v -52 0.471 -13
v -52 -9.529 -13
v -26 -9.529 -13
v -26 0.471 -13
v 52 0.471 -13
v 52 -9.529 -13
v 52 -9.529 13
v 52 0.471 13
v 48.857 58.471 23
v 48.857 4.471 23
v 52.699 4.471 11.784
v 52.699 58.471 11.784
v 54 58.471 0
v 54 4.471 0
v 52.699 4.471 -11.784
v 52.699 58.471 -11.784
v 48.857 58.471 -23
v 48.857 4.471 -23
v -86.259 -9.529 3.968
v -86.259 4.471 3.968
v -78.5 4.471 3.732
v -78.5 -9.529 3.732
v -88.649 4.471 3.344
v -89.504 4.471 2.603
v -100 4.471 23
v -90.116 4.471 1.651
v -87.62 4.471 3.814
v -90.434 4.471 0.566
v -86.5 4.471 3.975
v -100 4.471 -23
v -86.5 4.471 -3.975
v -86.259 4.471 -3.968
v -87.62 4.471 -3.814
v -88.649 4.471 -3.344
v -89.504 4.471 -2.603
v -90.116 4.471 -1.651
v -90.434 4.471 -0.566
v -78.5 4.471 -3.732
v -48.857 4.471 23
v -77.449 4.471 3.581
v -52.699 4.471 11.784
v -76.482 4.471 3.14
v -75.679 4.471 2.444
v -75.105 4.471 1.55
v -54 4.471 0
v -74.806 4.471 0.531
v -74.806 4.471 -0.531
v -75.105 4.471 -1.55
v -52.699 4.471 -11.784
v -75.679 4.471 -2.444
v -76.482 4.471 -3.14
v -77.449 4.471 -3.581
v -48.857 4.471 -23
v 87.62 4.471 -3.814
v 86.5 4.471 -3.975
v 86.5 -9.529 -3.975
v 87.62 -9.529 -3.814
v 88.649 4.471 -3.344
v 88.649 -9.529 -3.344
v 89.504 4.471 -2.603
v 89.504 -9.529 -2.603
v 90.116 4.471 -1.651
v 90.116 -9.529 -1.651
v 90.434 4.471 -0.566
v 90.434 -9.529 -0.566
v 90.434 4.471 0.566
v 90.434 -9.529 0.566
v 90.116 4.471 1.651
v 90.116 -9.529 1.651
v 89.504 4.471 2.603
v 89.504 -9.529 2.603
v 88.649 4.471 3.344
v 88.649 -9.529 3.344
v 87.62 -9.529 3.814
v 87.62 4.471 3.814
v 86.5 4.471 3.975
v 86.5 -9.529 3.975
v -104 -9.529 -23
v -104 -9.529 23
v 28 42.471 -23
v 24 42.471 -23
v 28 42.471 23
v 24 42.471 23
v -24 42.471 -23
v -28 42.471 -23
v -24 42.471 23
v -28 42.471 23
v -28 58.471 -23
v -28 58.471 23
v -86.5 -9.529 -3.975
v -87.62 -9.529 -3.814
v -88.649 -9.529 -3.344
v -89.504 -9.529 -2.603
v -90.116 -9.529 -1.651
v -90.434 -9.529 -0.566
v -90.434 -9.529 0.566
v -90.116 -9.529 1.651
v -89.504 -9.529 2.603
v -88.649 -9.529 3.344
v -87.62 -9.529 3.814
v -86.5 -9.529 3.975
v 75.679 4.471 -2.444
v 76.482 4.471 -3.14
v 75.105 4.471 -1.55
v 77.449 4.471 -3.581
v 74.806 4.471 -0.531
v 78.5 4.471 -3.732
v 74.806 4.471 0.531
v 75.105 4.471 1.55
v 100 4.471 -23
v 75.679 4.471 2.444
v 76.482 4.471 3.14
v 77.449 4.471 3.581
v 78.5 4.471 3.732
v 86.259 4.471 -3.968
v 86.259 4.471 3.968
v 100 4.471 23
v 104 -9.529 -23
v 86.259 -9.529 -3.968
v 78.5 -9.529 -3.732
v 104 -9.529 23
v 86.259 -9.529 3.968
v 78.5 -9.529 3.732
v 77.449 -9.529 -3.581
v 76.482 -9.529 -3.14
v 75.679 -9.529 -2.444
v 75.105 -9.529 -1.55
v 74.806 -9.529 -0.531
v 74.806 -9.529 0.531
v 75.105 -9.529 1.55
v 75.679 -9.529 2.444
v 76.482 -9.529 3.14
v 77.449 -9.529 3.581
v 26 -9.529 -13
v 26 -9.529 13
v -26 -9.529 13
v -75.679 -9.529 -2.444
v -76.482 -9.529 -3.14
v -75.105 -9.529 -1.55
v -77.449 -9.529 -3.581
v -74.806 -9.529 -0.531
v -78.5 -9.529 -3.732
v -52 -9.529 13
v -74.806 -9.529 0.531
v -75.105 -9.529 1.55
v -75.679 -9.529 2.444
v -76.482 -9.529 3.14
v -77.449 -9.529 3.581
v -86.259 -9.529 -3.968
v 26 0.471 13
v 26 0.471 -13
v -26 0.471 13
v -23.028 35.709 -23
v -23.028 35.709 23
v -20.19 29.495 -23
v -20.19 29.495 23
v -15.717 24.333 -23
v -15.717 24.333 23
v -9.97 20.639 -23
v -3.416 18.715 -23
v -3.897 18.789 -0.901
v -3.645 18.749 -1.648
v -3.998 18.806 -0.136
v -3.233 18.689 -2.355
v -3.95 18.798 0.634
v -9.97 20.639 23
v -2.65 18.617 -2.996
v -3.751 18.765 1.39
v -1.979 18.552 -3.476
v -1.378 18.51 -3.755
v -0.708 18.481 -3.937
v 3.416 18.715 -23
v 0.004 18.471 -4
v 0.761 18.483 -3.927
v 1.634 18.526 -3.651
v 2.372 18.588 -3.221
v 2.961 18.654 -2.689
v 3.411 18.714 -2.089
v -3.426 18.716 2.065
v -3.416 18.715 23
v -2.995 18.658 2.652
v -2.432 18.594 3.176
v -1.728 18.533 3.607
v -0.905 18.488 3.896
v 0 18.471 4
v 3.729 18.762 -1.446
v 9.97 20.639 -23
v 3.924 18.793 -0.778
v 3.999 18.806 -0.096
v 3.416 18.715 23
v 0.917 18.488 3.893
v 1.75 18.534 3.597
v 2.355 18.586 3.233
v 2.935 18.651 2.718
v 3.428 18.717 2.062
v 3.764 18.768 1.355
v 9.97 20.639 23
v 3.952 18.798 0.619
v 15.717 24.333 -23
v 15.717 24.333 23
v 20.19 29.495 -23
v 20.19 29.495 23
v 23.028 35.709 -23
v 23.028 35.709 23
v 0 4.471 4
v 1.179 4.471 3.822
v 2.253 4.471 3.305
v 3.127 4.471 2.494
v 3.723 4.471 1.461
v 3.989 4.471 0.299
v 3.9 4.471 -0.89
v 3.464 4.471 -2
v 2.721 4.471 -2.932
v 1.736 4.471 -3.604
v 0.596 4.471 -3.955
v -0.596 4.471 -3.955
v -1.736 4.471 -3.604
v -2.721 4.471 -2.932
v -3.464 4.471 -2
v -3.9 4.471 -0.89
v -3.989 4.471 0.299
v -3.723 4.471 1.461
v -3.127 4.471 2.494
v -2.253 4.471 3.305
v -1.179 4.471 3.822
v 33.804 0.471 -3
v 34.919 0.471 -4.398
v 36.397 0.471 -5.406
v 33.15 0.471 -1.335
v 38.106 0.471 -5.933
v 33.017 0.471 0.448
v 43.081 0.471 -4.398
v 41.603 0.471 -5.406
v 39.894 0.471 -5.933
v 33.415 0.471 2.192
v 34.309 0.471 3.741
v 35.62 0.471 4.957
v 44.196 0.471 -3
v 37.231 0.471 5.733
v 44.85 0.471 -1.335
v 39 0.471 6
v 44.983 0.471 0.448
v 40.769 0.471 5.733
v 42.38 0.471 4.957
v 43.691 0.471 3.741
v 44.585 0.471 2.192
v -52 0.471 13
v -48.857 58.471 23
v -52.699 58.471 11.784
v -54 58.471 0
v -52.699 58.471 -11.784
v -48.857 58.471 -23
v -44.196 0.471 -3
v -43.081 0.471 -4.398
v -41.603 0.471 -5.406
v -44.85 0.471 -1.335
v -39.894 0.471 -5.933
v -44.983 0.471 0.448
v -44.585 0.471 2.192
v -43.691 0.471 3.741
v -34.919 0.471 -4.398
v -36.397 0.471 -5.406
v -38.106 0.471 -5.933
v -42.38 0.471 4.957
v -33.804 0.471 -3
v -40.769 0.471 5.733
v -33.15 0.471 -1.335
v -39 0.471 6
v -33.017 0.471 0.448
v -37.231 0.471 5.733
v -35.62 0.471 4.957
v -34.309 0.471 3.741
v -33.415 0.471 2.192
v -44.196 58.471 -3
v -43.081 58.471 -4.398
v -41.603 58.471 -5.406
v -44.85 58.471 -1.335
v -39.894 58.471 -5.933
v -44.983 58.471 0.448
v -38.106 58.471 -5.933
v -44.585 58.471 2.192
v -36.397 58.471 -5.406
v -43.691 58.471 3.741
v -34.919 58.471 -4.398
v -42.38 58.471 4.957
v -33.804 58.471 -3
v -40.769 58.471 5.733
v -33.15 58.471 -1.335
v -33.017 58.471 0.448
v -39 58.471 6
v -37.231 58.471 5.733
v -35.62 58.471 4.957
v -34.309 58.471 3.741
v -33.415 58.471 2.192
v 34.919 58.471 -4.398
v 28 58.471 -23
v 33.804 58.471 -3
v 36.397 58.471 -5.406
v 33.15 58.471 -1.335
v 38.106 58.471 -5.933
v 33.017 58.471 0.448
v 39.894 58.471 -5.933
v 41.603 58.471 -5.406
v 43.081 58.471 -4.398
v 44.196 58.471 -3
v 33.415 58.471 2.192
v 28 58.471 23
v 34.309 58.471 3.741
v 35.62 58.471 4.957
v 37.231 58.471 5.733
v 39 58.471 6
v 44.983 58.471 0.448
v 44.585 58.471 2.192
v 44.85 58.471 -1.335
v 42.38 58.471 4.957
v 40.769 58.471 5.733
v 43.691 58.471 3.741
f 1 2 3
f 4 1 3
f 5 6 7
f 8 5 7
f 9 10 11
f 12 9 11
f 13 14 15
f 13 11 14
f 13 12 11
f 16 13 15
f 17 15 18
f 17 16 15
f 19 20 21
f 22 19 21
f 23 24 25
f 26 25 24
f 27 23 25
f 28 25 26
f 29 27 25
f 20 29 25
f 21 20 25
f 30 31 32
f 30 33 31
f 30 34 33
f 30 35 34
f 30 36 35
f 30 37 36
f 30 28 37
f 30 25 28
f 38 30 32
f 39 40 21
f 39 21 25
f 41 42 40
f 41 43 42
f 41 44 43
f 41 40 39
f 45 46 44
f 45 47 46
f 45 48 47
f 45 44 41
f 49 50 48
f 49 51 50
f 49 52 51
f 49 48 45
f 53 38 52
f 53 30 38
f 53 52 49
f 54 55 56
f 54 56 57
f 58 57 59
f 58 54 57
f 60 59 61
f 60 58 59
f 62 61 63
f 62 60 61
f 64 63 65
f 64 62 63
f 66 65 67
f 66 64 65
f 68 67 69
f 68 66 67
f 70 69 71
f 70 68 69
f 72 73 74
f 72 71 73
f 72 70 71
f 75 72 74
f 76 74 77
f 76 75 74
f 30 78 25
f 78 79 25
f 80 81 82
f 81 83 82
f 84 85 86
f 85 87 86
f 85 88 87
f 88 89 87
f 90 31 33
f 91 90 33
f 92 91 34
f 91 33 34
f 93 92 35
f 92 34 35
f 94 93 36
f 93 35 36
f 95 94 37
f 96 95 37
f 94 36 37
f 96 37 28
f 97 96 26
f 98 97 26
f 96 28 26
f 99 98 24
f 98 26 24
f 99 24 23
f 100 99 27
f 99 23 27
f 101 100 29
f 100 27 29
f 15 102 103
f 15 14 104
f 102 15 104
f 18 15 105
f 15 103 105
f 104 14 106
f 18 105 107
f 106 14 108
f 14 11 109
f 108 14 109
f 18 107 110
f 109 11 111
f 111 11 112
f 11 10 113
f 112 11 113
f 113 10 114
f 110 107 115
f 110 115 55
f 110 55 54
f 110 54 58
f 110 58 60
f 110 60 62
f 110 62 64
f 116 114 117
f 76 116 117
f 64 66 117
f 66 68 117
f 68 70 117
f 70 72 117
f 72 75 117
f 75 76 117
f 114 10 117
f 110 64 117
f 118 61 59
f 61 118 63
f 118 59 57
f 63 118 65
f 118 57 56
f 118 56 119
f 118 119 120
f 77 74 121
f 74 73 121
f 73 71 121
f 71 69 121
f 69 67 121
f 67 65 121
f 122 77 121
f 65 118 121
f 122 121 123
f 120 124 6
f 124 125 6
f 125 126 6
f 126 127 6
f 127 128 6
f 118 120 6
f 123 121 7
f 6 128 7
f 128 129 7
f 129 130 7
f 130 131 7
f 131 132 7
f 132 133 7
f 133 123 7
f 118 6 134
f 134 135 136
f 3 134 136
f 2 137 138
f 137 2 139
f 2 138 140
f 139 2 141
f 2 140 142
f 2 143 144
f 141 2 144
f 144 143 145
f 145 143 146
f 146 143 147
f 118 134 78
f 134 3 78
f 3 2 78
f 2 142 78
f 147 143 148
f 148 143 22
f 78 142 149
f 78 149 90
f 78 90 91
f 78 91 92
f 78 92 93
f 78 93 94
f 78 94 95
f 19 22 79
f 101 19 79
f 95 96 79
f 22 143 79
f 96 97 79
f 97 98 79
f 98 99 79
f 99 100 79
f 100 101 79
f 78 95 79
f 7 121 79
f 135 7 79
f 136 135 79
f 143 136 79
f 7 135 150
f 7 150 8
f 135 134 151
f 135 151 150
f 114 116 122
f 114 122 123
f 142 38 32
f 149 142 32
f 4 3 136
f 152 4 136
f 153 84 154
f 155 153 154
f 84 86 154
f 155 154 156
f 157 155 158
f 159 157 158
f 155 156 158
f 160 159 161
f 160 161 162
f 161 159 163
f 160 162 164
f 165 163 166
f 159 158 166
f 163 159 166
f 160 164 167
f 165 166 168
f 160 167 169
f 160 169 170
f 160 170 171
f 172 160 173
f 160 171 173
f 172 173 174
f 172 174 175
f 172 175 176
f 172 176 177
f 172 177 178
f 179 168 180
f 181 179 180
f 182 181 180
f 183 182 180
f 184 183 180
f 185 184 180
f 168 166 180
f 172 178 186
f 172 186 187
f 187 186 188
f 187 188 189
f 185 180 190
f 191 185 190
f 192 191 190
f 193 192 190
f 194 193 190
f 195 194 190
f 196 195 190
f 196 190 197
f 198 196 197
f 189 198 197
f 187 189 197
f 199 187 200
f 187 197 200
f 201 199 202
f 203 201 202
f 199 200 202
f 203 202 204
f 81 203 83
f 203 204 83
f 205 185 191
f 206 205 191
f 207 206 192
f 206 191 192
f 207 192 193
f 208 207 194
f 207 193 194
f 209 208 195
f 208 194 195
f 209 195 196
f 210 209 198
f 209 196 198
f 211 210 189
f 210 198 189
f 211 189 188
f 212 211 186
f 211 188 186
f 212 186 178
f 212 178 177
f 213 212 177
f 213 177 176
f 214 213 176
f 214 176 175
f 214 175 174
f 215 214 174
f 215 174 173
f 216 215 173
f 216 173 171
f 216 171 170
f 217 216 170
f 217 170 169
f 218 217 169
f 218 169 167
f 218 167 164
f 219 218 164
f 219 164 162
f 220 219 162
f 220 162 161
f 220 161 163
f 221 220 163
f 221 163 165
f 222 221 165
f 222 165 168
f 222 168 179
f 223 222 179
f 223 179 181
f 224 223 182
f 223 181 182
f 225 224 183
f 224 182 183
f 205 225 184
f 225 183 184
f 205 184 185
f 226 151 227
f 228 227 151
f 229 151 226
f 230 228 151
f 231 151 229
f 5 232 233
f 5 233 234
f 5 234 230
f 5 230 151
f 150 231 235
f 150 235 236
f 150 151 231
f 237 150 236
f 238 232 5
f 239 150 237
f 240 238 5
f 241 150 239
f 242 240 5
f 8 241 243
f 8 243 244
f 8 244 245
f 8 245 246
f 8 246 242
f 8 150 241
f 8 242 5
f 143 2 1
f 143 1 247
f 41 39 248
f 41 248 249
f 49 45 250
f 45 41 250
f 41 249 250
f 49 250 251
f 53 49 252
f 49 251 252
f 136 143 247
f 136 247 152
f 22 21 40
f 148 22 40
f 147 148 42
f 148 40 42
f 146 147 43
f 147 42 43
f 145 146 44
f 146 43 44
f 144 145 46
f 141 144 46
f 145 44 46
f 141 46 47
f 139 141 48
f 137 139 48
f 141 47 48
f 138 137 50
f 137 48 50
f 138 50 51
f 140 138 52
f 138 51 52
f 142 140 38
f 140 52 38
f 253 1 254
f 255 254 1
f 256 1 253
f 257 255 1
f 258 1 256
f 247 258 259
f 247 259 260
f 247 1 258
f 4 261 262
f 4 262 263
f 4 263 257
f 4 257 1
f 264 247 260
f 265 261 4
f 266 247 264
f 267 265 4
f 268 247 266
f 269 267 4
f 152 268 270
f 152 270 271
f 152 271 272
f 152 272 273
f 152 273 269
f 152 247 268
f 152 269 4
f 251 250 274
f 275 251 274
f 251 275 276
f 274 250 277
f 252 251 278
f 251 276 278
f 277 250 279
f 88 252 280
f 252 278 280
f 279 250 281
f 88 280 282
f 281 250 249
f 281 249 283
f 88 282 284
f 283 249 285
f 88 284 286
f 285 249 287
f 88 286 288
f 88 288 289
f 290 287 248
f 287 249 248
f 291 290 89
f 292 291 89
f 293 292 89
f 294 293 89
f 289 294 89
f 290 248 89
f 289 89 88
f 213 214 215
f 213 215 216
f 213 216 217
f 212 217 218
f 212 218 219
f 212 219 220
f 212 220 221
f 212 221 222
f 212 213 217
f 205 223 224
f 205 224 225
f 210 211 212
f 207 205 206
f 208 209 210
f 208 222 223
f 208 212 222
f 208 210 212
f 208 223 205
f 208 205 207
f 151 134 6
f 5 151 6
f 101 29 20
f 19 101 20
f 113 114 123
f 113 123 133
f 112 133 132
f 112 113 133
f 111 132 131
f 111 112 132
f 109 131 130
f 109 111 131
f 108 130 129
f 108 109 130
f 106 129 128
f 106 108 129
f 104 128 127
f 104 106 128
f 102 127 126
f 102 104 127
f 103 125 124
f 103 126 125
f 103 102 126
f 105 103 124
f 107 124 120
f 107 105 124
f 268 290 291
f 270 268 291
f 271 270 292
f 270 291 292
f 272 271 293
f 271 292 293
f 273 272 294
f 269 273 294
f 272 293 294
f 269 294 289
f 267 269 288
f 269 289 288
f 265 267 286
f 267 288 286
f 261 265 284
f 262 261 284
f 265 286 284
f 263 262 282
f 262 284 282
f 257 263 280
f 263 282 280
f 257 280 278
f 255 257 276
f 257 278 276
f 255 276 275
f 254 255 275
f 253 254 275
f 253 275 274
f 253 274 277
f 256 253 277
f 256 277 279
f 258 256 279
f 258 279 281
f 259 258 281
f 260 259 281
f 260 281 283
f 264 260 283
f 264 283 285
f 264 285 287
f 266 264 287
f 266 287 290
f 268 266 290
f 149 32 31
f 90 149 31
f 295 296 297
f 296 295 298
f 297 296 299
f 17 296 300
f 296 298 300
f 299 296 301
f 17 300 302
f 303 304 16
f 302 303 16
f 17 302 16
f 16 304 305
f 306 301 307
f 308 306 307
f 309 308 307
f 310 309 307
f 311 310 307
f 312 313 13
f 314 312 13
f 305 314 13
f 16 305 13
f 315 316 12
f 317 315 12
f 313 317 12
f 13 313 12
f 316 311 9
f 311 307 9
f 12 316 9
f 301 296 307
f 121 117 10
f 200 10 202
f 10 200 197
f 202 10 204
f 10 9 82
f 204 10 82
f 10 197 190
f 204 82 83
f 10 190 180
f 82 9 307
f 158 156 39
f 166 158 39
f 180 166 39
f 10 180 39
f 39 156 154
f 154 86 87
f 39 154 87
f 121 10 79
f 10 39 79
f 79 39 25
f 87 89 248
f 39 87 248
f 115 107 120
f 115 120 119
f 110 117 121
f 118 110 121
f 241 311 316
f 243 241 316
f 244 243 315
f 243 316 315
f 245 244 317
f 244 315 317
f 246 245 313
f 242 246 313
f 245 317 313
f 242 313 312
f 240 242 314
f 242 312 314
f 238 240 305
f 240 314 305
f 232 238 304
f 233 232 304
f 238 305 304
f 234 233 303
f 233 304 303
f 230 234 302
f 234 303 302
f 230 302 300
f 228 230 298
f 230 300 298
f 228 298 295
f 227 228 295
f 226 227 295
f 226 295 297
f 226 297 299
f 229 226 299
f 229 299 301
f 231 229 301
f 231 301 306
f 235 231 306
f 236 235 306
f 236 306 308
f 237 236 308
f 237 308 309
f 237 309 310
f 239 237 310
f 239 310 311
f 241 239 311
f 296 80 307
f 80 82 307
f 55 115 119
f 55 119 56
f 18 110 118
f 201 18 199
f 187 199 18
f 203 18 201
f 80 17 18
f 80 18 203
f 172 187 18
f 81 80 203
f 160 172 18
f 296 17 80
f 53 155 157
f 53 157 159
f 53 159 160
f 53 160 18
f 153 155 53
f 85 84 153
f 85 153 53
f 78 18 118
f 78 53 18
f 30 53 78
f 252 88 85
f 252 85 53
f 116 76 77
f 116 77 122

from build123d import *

# Parameters (mm, degrees)
BOSS_EXTRUDE1_DEPTH = 23
SKETCH2_R           = 6
CUT_EXTRUDE1_DEPTH  = 127.368508735
CUT_EXTRUDE2_DEPTH  = 54
CUT_EXTRUDE3_DEPTH  = 120.419428905
SKETCH5_R           = 4
CUT_EXTRUDE18_DEPTH = 24
SKETCH6_W           = 26
SKETCH6_H           = 26
CUT_EXTRUDE19_DEPTH = 10


with BuildPart() as part:
    # Sketch1 → Boss-Extrude1 (new, symmetric)
    with BuildSketch(Plane.XY):
        with BuildLine():
            Line((100, 4.470588235), (104, -9.529411765))
            Line((104, -9.529411765), (-104, -9.529411765))
            Line((-104, -9.529411765), (-100, 4.470588235))
            Line((-100, 4.470588235), (-54, 4.470588235))
            Line((-54, 4.470588235), (-54, 58.470588235))
            Line((-54, 58.470588235), (-28, 58.470588235))
            Line((-28, 58.470588235), (-28, 42.470588235))
            Line((-28, 42.470588235), (-24, 42.470588235))
            ThreePointArc((-24, 42.470588235), (0, 18.470588235), (24, 42.470588235))
            Line((24, 42.470588235), (28, 42.470588235))
            Line((28, 42.470588235), (28, 58.470588235))
            Line((28, 58.470588235), (54, 58.470588235))
            Line((54, 58.470588235), (54, 4.470588235))
            Line((54, 4.470588235), (100, 4.470588235))
        make_face()
    extrude(amount=BOSS_EXTRUDE1_DEPTH, both=True)

    # Sketch2 → Cut-Extrude1 (cut, through all)
    with BuildSketch(Plane(origin=(0, 58.470588235, 0), x_dir=(1, 0, 0), z_dir=(0, 1, 0))):
        with Locations(Location((-39, 0, 0), (0, 0, 270))):
            Circle(SKETCH2_R)
        with Locations(Location((39, 0, 0), (0, 0, 270))):
            Circle(SKETCH2_R)
    extrude(amount=-CUT_EXTRUDE1_DEPTH, mode=Mode.SUBTRACT)

    # Sketch3 → Cut-Extrude2 (cut)
    with BuildSketch(Plane(origin=(0, 58.470588235, 0), x_dir=(1, 0, 0), z_dir=(0, 1, 0))):
        with BuildLine():
            Line((-48.856934001, 23), (-69.801648505, 23))
            Line((-69.801648505, 23), (-69.801648505, -23))
            Line((-69.801648505, -23), (-48.856934001, -23))
            ThreePointArc((-48.856934001, -23), (-54, 0), (-48.856934001, 23))
        make_face()
        with BuildLine():
            Line((69.801648505, -23), (48.856934001, -23))
            ThreePointArc((48.856934001, -23), (54, 0), (48.856934001, 23))
            Line((48.856934001, 23), (69.801648505, 23))
            Line((69.801648505, 23), (69.801648505, -23))
        make_face()
    extrude(amount=-CUT_EXTRUDE2_DEPTH, mode=Mode.SUBTRACT)

    # Sketch4 → Cut-Extrude3 (cut, through all)
    with BuildSketch(Plane(origin=(0, 4.470588235, 0), x_dir=(1, 0, 0), z_dir=(0, 1, 0))):
        with BuildLine():
            Line((-86.259028478, 3.967568831), (-86.5, 3.974879835))
            ThreePointArc((-86.5, 3.974879835), (-90.474879835, 0), (-86.5, -3.974879835))
            Line((-86.5, -3.974879835), (-86.259028478, -3.967568831))
            Line((-86.259028478, -3.967568831), (-78.5, -3.732162222))
            ThreePointArc((-78.5, -3.732162222), (-74.767837778, 0), (-78.5, 3.732162222))
            Line((-78.5, 3.732162222), (-86.259028478, 3.967568831))
        make_face()
    cut_extrude3 = extrude(amount=-CUT_EXTRUDE3_DEPTH, mode=Mode.SUBTRACT)

    # Mirror1: Cut-Extrude3 across plane
    add(cut_extrude3.mirror(Plane(origin=(0, 0, 0), x_dir=(0, 0, 1), z_dir=(1, 0, 0))), mode=Mode.SUBTRACT)

    # Sketch5 → Cut-Extrude18 (cut)
    with BuildSketch(Plane(origin=(0, 28.470588235, 0), x_dir=(1, 0, 0), z_dir=(0, 1, 0))):
        with Locations(Location((0, 0, 0), (0, 0, 270))):
            Circle(SKETCH5_R)
    extrude(amount=-CUT_EXTRUDE18_DEPTH, mode=Mode.SUBTRACT)

    # Sketch6 → Cut-Extrude19 (cut)
    with BuildSketch(Plane.XZ.offset(9.529411765)):
        with Locations((-39, 0)):
            Rectangle(SKETCH6_W, SKETCH6_H)
        with Locations((39, 0)):
            Rectangle(SKETCH6_W, SKETCH6_H)
    extrude(amount=-CUT_EXTRUDE19_DEPTH, mode=Mode.SUBTRACT)


solid = part.part
